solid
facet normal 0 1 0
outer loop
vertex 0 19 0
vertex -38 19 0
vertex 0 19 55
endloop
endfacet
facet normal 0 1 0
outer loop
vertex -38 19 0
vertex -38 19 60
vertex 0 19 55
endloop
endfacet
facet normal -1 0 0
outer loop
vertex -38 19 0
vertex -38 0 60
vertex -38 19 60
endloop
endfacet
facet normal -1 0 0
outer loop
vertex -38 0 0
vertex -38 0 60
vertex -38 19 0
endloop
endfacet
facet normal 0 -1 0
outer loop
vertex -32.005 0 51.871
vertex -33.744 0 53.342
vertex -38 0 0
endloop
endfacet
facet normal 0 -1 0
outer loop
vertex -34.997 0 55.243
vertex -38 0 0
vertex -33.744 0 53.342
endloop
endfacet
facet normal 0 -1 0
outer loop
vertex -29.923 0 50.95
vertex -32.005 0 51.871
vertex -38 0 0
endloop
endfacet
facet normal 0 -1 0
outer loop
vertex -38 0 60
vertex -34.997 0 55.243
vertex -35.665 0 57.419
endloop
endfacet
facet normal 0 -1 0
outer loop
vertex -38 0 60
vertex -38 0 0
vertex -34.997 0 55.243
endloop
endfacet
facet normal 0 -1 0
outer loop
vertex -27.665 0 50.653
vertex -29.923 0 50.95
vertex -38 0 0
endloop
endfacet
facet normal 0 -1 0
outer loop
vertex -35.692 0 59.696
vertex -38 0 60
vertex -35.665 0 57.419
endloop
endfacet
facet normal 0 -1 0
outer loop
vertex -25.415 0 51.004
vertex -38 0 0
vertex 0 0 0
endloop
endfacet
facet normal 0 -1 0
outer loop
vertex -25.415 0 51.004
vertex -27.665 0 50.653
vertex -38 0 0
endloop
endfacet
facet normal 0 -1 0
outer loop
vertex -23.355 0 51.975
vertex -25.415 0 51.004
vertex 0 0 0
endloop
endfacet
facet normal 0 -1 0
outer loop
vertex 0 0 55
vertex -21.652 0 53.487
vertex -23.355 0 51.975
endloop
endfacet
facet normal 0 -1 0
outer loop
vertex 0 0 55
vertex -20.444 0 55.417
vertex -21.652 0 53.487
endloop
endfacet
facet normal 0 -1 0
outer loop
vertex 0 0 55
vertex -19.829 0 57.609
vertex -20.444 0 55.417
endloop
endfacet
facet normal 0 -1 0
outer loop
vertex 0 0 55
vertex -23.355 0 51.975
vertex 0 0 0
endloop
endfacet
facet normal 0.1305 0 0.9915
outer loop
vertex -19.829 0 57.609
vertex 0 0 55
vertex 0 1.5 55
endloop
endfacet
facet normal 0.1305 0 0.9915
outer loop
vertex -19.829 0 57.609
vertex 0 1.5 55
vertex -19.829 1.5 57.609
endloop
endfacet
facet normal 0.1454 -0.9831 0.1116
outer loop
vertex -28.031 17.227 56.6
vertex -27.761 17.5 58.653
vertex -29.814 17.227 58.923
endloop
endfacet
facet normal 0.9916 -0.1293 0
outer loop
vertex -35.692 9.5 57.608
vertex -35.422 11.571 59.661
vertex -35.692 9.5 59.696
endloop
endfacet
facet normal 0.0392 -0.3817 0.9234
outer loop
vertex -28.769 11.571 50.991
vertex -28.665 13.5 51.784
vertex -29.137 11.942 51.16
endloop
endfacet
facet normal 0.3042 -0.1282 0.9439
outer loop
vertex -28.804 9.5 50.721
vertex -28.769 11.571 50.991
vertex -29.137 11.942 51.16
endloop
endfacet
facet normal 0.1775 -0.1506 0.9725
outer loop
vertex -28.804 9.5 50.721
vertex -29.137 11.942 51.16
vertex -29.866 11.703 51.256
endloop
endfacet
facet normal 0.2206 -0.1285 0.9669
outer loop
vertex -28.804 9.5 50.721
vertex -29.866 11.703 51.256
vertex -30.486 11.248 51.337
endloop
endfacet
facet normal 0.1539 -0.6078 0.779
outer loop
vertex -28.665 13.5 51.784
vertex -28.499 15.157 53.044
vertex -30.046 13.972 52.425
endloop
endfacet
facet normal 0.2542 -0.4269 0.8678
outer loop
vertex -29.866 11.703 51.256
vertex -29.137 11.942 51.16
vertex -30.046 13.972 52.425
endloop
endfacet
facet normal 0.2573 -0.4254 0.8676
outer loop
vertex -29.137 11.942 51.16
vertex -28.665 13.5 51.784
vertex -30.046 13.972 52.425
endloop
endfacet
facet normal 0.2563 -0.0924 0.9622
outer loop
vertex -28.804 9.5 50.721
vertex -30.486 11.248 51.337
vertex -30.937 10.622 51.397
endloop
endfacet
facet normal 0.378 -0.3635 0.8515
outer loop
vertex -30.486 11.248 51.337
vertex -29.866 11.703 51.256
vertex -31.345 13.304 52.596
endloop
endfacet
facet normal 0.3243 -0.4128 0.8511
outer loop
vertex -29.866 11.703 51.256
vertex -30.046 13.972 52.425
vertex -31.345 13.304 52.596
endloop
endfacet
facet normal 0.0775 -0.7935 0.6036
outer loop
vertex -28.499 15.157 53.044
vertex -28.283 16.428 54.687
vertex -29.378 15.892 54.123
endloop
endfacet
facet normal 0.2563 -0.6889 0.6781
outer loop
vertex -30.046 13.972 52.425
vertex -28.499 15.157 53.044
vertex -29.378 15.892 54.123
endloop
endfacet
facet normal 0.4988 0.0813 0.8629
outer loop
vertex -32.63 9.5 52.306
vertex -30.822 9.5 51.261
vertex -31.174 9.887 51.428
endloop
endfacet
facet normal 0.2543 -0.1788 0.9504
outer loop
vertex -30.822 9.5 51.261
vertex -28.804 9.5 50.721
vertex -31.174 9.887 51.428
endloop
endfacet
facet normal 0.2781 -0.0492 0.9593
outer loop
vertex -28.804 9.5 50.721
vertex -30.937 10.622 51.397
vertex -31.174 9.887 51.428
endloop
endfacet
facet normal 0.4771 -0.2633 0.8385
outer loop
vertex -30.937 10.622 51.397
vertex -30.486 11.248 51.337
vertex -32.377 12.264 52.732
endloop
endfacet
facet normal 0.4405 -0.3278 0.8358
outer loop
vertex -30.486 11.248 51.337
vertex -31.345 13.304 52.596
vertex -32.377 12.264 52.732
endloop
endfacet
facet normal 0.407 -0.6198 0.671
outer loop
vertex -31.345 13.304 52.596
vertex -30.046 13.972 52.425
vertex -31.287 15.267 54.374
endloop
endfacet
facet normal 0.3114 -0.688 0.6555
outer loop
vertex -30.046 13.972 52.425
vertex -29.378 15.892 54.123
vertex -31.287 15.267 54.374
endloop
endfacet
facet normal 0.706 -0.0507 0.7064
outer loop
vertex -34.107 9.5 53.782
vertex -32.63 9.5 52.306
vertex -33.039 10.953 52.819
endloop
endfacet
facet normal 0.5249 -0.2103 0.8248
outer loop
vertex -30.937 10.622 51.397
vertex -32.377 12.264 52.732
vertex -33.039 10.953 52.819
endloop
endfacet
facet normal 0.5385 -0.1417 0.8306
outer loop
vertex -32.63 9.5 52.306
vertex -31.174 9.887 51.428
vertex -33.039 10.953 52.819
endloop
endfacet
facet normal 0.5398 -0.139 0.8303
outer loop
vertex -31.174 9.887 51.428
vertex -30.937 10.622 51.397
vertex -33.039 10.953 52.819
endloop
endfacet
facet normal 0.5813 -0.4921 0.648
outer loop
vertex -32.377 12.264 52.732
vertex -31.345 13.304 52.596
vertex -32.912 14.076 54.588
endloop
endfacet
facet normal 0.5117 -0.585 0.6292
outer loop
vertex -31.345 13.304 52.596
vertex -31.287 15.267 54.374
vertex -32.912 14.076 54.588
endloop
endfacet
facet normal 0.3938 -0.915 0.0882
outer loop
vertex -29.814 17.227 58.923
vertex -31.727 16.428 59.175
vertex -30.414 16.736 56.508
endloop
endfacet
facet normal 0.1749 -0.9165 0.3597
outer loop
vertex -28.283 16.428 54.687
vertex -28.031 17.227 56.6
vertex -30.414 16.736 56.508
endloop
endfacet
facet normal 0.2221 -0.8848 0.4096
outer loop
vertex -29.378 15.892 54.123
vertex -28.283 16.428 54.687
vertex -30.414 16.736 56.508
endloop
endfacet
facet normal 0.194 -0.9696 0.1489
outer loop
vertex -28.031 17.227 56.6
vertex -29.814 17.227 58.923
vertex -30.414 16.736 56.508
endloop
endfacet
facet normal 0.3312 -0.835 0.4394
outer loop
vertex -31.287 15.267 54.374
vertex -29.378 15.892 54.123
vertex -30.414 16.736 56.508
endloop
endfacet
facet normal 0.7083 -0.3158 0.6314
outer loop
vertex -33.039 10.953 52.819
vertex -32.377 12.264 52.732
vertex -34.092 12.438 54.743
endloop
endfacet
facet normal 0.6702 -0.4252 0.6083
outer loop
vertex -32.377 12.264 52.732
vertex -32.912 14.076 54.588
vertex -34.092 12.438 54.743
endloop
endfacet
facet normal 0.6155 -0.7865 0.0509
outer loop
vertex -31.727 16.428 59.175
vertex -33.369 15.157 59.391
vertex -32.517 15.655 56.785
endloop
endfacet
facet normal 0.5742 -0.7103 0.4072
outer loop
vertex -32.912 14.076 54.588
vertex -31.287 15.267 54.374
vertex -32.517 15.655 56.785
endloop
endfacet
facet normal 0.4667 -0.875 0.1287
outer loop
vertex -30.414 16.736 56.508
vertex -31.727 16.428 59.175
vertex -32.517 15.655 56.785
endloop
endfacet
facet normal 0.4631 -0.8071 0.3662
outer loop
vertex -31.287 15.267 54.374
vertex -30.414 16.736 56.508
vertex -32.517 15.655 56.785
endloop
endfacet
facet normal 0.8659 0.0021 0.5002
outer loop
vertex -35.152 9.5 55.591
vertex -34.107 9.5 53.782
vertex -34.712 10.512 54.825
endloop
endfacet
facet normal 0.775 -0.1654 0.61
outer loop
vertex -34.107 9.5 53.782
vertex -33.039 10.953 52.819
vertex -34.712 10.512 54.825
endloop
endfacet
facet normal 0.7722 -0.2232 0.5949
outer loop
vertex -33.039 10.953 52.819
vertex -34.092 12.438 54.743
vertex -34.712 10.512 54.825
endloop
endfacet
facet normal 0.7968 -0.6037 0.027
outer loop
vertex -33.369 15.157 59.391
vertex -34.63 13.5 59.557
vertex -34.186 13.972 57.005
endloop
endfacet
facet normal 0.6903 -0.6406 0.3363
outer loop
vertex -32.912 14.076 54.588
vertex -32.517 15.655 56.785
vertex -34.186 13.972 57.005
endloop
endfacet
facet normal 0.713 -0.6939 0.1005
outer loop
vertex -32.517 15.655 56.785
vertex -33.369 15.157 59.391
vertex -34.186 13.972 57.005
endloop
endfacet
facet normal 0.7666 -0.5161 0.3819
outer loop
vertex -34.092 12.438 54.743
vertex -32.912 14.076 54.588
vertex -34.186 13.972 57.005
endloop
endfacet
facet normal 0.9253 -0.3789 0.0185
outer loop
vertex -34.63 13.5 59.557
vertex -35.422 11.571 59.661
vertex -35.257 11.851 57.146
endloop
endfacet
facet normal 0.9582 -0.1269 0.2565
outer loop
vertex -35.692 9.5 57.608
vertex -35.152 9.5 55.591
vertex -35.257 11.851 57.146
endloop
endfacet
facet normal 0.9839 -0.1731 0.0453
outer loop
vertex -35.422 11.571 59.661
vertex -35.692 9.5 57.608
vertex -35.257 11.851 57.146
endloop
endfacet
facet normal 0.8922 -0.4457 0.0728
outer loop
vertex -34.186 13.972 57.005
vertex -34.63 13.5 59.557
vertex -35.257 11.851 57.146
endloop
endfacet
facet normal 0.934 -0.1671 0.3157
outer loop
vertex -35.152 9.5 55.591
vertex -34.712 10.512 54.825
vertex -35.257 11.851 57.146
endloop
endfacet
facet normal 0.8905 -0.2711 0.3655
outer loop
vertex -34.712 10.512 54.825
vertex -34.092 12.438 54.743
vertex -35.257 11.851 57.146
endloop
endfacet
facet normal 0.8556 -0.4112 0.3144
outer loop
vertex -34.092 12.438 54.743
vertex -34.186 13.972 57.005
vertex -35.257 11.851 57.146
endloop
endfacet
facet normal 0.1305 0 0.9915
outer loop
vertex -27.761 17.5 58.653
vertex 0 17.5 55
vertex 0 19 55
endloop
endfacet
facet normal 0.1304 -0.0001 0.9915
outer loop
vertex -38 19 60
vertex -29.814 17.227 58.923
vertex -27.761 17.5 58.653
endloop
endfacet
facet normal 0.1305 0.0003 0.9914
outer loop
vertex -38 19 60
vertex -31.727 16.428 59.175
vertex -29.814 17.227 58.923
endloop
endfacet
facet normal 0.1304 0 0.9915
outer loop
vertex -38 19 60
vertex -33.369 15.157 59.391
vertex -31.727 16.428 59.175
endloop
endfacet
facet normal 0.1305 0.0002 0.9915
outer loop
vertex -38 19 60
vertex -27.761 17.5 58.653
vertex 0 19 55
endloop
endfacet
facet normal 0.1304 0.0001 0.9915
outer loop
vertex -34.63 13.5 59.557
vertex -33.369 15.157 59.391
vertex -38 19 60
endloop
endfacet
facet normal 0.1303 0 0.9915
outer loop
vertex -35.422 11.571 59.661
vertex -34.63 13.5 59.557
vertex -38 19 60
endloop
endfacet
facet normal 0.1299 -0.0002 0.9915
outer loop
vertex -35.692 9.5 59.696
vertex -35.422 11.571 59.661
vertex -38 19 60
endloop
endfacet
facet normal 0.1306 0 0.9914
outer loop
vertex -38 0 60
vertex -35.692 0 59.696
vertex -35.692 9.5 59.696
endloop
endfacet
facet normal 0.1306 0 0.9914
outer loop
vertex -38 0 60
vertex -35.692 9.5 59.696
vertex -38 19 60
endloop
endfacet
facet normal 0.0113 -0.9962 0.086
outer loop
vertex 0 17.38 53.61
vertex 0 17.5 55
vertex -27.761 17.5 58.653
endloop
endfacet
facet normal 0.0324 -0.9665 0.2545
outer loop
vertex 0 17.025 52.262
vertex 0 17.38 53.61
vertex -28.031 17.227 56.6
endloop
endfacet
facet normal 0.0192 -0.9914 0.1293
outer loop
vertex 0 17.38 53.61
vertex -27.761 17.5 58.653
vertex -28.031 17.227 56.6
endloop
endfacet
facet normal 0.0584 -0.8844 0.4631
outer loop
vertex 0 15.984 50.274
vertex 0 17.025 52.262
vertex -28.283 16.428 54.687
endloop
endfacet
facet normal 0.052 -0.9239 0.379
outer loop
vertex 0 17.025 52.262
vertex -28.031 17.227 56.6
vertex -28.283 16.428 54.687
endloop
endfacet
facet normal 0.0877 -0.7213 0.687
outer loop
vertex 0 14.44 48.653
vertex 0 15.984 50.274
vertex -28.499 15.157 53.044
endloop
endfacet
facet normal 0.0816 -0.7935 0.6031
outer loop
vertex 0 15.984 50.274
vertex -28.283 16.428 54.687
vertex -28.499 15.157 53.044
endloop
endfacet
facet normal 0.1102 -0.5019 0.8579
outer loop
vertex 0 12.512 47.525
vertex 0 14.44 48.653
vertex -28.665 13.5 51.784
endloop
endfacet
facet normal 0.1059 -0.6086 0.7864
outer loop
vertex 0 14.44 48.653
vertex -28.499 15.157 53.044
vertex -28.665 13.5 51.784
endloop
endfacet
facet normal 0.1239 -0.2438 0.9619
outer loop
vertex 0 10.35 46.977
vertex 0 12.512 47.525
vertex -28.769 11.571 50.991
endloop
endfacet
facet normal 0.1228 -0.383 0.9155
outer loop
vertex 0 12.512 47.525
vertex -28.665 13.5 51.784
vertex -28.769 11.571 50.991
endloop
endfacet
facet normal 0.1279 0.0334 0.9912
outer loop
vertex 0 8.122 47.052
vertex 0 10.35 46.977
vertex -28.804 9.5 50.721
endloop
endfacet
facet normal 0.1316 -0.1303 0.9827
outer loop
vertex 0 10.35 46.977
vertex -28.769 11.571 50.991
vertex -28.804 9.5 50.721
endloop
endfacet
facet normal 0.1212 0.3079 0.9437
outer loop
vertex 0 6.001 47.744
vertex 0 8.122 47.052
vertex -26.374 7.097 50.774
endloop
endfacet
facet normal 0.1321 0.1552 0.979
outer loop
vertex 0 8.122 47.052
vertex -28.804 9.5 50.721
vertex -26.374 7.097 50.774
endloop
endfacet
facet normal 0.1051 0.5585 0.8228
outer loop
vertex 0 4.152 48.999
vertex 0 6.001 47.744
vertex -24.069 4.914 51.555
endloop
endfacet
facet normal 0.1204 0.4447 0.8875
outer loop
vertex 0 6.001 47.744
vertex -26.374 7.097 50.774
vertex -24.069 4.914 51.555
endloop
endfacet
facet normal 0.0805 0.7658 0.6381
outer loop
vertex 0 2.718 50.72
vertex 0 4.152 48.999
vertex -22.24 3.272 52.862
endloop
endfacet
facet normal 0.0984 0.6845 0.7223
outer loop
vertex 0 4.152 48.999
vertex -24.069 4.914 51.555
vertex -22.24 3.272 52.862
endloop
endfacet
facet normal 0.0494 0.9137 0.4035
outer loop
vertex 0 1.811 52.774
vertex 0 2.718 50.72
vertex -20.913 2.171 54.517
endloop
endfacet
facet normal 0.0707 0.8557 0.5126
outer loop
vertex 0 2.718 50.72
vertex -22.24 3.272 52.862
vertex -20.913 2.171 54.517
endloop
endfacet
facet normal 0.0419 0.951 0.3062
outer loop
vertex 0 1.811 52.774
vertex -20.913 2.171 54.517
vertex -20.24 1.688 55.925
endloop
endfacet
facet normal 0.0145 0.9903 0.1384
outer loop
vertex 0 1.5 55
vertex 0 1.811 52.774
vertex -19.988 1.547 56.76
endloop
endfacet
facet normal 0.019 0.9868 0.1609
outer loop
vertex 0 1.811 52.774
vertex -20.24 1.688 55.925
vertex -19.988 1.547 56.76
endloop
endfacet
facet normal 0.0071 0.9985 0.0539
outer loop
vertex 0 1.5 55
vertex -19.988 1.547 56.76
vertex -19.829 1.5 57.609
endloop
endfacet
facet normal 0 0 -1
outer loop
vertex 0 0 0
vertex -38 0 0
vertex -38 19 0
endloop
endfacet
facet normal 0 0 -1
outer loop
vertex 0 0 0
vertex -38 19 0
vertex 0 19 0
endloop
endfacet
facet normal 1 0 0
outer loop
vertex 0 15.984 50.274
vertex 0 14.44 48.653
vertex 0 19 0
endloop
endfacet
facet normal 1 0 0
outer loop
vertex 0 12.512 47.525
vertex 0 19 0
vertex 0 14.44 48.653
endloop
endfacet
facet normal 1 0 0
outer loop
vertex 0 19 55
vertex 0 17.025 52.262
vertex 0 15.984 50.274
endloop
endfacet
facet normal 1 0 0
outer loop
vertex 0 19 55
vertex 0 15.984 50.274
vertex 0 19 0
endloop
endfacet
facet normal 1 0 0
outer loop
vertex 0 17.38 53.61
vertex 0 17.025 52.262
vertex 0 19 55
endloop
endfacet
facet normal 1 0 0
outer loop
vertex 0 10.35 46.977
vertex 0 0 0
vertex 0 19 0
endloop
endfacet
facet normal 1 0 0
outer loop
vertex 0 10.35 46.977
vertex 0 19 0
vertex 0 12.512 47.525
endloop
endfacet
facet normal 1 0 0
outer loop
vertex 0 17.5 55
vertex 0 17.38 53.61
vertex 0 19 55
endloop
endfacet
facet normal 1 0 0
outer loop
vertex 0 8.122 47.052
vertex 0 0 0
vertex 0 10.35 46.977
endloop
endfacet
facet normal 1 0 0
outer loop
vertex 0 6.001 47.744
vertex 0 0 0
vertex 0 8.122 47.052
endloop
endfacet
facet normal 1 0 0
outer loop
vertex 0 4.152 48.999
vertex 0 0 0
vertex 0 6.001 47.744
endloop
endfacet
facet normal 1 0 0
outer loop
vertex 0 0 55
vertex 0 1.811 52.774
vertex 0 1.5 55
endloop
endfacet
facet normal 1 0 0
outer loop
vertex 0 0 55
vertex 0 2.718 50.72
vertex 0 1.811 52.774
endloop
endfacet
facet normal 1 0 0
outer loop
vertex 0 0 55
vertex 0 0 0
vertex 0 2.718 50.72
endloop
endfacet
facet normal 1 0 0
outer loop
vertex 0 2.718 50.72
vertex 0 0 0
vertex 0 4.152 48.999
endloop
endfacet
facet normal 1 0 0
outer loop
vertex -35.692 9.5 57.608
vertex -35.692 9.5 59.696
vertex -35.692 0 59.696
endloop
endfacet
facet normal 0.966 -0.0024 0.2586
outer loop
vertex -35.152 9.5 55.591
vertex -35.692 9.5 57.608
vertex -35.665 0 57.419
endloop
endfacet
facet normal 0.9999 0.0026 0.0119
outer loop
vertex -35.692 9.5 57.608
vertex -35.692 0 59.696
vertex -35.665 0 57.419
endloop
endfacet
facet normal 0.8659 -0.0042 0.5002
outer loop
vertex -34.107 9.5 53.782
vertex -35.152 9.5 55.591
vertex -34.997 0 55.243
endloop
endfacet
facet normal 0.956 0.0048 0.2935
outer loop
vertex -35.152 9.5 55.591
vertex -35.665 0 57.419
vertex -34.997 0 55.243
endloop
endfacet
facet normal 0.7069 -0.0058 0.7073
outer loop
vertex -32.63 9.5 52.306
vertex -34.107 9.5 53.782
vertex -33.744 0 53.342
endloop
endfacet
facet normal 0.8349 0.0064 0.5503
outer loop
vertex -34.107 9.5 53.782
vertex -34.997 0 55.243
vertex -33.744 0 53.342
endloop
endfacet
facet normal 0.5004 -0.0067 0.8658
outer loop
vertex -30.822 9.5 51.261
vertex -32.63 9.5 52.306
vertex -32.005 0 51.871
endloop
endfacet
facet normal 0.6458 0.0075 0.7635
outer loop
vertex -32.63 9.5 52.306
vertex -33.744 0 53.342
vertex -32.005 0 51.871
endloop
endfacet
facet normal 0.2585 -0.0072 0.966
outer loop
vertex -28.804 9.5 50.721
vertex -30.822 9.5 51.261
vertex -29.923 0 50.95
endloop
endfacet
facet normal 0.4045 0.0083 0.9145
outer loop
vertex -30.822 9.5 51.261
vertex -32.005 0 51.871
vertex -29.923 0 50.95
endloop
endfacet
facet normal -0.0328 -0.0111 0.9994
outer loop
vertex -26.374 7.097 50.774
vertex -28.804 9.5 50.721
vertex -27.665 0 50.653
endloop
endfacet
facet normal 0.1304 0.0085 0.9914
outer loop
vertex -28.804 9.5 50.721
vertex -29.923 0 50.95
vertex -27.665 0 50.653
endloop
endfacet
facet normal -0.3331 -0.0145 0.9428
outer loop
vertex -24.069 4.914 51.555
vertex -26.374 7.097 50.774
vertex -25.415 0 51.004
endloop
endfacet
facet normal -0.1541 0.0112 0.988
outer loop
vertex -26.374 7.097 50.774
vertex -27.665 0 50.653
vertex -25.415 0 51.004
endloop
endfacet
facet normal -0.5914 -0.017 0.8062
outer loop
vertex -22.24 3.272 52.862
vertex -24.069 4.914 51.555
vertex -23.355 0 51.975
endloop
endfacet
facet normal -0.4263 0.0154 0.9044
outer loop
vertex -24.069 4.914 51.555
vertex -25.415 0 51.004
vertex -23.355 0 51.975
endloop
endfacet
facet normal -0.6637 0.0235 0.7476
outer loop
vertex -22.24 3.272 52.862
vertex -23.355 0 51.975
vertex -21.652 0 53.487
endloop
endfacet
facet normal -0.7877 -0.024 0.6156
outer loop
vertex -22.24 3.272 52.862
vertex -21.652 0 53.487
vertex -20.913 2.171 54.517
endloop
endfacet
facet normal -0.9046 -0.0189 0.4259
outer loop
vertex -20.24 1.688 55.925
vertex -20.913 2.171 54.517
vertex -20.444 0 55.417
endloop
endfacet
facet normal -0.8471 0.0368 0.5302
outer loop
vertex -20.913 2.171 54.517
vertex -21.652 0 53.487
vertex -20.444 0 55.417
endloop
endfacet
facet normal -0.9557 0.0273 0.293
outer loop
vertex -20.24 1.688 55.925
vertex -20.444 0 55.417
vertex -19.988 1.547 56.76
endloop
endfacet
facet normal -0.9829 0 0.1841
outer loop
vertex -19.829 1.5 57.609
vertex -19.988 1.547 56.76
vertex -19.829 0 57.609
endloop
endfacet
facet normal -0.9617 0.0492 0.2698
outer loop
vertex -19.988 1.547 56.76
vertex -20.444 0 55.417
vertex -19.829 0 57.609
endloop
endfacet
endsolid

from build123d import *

# Parameters (mm, degrees)
F1_DEPTH = 19
F4_DEPTH = 28
F9_DEPTH = 9.5


with BuildPart() as f1:
    # F0 (on Front) → F1 (new body)
    with BuildSketch(Plane.XZ):
        Polygon((-38, 0), (0, 0), (0, 55), (-38, 60), align=None)
    extrude(amount=-F1_DEPTH)

    # F3 (on 3pt) → F4 (cut, symmetric)
    with BuildSketch(Plane(origin=(-7.1136827774, 0, 0.9360108918), x_dir=(0, -1, 0), z_dir=(-0.9914542955, 0, 0.1304545126))):
        with BuildLine():
            Line((-1.5, 54.5299862548), (-17.5, 54.5299862548))
            ThreePointArc((-17.5, 54.5299862548), (-9.5, 46.5299862548), (-1.5, 54.5299862548))
        make_face()
    extrude(amount=F4_DEPTH, both=True, mode=Mode.SUBTRACT)

    # F6 (on offset) → F7 (revolve, cut)
    with BuildSketch(Plane(origin=(-34.8744030526, 0, 4.5887372438), x_dir=(0, 1, 0), z_dir=(0.9914542955, 0, -0.1304545126))):
        with BuildLine():
            ThreePointArc((9.5, 46.5299862548), (15.1568542495, 48.8731320053), (17.5, 54.5299862548))
            Line((17.5, 54.5299862548), (9.5, 54.5299862548))
            Line((9.5, 54.5299862548), (9.5, 46.5299862548))
        make_face()
    revolve(axis=Axis((-28.2825383255, 9.5, 54.6869091698), (0.1304545126, 0, 0.9914542955)), mode=Mode.SUBTRACT)

    # F8 (on Front) → F9 (cut)
    with BuildSketch(Plane.XZ):
        with BuildLine():
            ThreePointArc((-35.6923546395, 59.6963624526), (-28.8043563758, 50.7210919877), (-19.8290859109, 57.6090902514))
            Line((-19.8290859109, 57.6090902514), (-35.6923546395, 59.6963624526))
        make_face()
    extrude(amount=-F9_DEPTH, mode=Mode.SUBTRACT)


solid = f1.part
